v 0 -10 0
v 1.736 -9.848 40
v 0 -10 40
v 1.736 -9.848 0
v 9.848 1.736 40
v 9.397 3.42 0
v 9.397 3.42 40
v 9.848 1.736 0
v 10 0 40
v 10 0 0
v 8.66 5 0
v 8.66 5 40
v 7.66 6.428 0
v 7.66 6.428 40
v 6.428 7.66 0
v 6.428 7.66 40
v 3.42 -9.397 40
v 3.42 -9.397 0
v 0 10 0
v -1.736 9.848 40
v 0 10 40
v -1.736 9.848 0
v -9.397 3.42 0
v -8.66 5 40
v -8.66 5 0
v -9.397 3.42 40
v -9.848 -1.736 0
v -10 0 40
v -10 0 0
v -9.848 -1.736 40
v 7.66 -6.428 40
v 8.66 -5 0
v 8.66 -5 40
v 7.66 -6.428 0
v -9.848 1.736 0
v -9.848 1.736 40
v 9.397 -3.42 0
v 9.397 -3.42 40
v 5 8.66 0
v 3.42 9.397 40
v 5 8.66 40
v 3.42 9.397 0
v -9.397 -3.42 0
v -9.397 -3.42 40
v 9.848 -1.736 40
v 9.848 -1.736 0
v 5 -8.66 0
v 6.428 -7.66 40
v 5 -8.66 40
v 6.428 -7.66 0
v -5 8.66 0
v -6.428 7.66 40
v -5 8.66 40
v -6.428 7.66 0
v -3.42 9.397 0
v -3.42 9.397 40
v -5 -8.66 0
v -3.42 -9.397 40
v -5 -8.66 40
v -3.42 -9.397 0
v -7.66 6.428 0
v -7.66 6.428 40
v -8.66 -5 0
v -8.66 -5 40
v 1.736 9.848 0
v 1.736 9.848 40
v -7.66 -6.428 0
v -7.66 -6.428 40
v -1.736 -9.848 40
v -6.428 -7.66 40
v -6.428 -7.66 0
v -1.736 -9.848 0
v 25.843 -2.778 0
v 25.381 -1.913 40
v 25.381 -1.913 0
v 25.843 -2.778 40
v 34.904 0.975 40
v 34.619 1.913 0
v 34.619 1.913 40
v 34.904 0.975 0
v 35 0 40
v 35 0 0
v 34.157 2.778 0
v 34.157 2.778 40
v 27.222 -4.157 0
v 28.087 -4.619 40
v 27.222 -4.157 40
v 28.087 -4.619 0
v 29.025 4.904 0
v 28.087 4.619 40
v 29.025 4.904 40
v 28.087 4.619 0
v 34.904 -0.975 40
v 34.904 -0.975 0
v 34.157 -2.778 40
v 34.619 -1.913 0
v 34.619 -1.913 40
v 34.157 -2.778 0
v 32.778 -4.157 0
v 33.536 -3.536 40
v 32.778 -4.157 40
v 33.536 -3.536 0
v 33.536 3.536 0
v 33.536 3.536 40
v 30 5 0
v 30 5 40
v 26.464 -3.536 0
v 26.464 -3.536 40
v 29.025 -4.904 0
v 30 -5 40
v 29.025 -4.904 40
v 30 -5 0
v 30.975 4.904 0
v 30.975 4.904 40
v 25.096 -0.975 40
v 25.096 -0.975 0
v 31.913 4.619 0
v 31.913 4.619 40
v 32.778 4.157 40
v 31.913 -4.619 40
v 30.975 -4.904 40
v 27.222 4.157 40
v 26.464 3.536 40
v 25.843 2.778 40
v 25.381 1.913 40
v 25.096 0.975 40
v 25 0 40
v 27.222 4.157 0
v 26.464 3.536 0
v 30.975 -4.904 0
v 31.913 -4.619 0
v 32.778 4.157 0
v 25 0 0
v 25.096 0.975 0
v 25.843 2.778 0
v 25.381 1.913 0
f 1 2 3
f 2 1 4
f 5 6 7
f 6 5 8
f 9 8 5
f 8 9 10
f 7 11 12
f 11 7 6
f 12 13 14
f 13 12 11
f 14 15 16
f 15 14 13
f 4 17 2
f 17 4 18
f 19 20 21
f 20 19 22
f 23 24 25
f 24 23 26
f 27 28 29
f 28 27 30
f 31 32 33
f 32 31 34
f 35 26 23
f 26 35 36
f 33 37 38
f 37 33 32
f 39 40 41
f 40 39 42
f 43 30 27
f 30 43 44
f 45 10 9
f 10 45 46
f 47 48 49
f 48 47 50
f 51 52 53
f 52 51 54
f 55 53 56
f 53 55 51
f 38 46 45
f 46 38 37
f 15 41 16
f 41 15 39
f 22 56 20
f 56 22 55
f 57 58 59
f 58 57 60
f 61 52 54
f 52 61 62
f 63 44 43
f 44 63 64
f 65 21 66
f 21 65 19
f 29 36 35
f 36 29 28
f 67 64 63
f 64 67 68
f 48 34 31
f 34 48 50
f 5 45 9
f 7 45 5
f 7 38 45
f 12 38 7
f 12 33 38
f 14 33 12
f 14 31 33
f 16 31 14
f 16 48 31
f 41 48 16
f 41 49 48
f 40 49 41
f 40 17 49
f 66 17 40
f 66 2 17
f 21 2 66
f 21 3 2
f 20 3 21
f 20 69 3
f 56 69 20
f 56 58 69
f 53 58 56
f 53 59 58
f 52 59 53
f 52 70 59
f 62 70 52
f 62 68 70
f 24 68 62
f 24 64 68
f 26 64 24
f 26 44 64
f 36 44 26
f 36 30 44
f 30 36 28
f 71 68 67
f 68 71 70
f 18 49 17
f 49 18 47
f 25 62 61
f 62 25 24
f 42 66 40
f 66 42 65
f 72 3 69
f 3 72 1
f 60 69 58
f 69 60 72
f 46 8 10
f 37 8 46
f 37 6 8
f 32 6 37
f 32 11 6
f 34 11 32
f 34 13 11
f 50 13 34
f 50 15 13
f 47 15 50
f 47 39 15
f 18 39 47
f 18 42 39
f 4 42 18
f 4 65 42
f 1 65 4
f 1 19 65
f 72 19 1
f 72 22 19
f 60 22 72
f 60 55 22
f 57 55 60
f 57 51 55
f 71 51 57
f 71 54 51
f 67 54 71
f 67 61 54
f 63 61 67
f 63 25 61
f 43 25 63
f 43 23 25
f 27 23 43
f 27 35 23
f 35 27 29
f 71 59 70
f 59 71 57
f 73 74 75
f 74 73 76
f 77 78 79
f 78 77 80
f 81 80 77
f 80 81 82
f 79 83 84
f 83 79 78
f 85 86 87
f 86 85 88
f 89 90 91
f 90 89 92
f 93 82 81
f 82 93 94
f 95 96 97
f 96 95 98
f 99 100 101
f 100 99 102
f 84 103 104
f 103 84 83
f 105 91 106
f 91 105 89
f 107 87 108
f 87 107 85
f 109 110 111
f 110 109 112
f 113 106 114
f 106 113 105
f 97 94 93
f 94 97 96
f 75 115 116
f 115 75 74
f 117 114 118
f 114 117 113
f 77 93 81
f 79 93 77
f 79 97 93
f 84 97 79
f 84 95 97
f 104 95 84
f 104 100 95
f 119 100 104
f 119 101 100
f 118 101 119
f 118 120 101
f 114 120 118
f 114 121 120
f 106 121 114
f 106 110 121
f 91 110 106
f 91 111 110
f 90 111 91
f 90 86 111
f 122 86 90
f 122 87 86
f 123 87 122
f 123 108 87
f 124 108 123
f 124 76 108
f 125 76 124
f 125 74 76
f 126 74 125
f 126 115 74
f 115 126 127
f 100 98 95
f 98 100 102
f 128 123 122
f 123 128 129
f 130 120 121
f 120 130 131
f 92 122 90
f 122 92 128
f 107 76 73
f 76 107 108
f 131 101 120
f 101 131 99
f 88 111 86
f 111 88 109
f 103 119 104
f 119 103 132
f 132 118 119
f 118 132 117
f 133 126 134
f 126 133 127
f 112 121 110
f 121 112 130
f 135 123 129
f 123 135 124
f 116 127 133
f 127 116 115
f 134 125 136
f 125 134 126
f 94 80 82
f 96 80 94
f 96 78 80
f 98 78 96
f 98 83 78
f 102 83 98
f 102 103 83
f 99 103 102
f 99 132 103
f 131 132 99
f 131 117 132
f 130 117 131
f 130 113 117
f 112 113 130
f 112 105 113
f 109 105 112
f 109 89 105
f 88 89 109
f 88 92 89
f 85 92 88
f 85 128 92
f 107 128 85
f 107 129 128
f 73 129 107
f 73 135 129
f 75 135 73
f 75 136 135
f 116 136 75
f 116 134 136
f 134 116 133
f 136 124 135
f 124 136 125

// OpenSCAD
$fs=1;
$fa=10;
cylinder(r=10,h=40);
translate([30,0,0])cylinder(r=5,h=40);

//screen capture settings
$vpr=[70,0,25];
$vpd=140;
$vpt=[8,15,16];
